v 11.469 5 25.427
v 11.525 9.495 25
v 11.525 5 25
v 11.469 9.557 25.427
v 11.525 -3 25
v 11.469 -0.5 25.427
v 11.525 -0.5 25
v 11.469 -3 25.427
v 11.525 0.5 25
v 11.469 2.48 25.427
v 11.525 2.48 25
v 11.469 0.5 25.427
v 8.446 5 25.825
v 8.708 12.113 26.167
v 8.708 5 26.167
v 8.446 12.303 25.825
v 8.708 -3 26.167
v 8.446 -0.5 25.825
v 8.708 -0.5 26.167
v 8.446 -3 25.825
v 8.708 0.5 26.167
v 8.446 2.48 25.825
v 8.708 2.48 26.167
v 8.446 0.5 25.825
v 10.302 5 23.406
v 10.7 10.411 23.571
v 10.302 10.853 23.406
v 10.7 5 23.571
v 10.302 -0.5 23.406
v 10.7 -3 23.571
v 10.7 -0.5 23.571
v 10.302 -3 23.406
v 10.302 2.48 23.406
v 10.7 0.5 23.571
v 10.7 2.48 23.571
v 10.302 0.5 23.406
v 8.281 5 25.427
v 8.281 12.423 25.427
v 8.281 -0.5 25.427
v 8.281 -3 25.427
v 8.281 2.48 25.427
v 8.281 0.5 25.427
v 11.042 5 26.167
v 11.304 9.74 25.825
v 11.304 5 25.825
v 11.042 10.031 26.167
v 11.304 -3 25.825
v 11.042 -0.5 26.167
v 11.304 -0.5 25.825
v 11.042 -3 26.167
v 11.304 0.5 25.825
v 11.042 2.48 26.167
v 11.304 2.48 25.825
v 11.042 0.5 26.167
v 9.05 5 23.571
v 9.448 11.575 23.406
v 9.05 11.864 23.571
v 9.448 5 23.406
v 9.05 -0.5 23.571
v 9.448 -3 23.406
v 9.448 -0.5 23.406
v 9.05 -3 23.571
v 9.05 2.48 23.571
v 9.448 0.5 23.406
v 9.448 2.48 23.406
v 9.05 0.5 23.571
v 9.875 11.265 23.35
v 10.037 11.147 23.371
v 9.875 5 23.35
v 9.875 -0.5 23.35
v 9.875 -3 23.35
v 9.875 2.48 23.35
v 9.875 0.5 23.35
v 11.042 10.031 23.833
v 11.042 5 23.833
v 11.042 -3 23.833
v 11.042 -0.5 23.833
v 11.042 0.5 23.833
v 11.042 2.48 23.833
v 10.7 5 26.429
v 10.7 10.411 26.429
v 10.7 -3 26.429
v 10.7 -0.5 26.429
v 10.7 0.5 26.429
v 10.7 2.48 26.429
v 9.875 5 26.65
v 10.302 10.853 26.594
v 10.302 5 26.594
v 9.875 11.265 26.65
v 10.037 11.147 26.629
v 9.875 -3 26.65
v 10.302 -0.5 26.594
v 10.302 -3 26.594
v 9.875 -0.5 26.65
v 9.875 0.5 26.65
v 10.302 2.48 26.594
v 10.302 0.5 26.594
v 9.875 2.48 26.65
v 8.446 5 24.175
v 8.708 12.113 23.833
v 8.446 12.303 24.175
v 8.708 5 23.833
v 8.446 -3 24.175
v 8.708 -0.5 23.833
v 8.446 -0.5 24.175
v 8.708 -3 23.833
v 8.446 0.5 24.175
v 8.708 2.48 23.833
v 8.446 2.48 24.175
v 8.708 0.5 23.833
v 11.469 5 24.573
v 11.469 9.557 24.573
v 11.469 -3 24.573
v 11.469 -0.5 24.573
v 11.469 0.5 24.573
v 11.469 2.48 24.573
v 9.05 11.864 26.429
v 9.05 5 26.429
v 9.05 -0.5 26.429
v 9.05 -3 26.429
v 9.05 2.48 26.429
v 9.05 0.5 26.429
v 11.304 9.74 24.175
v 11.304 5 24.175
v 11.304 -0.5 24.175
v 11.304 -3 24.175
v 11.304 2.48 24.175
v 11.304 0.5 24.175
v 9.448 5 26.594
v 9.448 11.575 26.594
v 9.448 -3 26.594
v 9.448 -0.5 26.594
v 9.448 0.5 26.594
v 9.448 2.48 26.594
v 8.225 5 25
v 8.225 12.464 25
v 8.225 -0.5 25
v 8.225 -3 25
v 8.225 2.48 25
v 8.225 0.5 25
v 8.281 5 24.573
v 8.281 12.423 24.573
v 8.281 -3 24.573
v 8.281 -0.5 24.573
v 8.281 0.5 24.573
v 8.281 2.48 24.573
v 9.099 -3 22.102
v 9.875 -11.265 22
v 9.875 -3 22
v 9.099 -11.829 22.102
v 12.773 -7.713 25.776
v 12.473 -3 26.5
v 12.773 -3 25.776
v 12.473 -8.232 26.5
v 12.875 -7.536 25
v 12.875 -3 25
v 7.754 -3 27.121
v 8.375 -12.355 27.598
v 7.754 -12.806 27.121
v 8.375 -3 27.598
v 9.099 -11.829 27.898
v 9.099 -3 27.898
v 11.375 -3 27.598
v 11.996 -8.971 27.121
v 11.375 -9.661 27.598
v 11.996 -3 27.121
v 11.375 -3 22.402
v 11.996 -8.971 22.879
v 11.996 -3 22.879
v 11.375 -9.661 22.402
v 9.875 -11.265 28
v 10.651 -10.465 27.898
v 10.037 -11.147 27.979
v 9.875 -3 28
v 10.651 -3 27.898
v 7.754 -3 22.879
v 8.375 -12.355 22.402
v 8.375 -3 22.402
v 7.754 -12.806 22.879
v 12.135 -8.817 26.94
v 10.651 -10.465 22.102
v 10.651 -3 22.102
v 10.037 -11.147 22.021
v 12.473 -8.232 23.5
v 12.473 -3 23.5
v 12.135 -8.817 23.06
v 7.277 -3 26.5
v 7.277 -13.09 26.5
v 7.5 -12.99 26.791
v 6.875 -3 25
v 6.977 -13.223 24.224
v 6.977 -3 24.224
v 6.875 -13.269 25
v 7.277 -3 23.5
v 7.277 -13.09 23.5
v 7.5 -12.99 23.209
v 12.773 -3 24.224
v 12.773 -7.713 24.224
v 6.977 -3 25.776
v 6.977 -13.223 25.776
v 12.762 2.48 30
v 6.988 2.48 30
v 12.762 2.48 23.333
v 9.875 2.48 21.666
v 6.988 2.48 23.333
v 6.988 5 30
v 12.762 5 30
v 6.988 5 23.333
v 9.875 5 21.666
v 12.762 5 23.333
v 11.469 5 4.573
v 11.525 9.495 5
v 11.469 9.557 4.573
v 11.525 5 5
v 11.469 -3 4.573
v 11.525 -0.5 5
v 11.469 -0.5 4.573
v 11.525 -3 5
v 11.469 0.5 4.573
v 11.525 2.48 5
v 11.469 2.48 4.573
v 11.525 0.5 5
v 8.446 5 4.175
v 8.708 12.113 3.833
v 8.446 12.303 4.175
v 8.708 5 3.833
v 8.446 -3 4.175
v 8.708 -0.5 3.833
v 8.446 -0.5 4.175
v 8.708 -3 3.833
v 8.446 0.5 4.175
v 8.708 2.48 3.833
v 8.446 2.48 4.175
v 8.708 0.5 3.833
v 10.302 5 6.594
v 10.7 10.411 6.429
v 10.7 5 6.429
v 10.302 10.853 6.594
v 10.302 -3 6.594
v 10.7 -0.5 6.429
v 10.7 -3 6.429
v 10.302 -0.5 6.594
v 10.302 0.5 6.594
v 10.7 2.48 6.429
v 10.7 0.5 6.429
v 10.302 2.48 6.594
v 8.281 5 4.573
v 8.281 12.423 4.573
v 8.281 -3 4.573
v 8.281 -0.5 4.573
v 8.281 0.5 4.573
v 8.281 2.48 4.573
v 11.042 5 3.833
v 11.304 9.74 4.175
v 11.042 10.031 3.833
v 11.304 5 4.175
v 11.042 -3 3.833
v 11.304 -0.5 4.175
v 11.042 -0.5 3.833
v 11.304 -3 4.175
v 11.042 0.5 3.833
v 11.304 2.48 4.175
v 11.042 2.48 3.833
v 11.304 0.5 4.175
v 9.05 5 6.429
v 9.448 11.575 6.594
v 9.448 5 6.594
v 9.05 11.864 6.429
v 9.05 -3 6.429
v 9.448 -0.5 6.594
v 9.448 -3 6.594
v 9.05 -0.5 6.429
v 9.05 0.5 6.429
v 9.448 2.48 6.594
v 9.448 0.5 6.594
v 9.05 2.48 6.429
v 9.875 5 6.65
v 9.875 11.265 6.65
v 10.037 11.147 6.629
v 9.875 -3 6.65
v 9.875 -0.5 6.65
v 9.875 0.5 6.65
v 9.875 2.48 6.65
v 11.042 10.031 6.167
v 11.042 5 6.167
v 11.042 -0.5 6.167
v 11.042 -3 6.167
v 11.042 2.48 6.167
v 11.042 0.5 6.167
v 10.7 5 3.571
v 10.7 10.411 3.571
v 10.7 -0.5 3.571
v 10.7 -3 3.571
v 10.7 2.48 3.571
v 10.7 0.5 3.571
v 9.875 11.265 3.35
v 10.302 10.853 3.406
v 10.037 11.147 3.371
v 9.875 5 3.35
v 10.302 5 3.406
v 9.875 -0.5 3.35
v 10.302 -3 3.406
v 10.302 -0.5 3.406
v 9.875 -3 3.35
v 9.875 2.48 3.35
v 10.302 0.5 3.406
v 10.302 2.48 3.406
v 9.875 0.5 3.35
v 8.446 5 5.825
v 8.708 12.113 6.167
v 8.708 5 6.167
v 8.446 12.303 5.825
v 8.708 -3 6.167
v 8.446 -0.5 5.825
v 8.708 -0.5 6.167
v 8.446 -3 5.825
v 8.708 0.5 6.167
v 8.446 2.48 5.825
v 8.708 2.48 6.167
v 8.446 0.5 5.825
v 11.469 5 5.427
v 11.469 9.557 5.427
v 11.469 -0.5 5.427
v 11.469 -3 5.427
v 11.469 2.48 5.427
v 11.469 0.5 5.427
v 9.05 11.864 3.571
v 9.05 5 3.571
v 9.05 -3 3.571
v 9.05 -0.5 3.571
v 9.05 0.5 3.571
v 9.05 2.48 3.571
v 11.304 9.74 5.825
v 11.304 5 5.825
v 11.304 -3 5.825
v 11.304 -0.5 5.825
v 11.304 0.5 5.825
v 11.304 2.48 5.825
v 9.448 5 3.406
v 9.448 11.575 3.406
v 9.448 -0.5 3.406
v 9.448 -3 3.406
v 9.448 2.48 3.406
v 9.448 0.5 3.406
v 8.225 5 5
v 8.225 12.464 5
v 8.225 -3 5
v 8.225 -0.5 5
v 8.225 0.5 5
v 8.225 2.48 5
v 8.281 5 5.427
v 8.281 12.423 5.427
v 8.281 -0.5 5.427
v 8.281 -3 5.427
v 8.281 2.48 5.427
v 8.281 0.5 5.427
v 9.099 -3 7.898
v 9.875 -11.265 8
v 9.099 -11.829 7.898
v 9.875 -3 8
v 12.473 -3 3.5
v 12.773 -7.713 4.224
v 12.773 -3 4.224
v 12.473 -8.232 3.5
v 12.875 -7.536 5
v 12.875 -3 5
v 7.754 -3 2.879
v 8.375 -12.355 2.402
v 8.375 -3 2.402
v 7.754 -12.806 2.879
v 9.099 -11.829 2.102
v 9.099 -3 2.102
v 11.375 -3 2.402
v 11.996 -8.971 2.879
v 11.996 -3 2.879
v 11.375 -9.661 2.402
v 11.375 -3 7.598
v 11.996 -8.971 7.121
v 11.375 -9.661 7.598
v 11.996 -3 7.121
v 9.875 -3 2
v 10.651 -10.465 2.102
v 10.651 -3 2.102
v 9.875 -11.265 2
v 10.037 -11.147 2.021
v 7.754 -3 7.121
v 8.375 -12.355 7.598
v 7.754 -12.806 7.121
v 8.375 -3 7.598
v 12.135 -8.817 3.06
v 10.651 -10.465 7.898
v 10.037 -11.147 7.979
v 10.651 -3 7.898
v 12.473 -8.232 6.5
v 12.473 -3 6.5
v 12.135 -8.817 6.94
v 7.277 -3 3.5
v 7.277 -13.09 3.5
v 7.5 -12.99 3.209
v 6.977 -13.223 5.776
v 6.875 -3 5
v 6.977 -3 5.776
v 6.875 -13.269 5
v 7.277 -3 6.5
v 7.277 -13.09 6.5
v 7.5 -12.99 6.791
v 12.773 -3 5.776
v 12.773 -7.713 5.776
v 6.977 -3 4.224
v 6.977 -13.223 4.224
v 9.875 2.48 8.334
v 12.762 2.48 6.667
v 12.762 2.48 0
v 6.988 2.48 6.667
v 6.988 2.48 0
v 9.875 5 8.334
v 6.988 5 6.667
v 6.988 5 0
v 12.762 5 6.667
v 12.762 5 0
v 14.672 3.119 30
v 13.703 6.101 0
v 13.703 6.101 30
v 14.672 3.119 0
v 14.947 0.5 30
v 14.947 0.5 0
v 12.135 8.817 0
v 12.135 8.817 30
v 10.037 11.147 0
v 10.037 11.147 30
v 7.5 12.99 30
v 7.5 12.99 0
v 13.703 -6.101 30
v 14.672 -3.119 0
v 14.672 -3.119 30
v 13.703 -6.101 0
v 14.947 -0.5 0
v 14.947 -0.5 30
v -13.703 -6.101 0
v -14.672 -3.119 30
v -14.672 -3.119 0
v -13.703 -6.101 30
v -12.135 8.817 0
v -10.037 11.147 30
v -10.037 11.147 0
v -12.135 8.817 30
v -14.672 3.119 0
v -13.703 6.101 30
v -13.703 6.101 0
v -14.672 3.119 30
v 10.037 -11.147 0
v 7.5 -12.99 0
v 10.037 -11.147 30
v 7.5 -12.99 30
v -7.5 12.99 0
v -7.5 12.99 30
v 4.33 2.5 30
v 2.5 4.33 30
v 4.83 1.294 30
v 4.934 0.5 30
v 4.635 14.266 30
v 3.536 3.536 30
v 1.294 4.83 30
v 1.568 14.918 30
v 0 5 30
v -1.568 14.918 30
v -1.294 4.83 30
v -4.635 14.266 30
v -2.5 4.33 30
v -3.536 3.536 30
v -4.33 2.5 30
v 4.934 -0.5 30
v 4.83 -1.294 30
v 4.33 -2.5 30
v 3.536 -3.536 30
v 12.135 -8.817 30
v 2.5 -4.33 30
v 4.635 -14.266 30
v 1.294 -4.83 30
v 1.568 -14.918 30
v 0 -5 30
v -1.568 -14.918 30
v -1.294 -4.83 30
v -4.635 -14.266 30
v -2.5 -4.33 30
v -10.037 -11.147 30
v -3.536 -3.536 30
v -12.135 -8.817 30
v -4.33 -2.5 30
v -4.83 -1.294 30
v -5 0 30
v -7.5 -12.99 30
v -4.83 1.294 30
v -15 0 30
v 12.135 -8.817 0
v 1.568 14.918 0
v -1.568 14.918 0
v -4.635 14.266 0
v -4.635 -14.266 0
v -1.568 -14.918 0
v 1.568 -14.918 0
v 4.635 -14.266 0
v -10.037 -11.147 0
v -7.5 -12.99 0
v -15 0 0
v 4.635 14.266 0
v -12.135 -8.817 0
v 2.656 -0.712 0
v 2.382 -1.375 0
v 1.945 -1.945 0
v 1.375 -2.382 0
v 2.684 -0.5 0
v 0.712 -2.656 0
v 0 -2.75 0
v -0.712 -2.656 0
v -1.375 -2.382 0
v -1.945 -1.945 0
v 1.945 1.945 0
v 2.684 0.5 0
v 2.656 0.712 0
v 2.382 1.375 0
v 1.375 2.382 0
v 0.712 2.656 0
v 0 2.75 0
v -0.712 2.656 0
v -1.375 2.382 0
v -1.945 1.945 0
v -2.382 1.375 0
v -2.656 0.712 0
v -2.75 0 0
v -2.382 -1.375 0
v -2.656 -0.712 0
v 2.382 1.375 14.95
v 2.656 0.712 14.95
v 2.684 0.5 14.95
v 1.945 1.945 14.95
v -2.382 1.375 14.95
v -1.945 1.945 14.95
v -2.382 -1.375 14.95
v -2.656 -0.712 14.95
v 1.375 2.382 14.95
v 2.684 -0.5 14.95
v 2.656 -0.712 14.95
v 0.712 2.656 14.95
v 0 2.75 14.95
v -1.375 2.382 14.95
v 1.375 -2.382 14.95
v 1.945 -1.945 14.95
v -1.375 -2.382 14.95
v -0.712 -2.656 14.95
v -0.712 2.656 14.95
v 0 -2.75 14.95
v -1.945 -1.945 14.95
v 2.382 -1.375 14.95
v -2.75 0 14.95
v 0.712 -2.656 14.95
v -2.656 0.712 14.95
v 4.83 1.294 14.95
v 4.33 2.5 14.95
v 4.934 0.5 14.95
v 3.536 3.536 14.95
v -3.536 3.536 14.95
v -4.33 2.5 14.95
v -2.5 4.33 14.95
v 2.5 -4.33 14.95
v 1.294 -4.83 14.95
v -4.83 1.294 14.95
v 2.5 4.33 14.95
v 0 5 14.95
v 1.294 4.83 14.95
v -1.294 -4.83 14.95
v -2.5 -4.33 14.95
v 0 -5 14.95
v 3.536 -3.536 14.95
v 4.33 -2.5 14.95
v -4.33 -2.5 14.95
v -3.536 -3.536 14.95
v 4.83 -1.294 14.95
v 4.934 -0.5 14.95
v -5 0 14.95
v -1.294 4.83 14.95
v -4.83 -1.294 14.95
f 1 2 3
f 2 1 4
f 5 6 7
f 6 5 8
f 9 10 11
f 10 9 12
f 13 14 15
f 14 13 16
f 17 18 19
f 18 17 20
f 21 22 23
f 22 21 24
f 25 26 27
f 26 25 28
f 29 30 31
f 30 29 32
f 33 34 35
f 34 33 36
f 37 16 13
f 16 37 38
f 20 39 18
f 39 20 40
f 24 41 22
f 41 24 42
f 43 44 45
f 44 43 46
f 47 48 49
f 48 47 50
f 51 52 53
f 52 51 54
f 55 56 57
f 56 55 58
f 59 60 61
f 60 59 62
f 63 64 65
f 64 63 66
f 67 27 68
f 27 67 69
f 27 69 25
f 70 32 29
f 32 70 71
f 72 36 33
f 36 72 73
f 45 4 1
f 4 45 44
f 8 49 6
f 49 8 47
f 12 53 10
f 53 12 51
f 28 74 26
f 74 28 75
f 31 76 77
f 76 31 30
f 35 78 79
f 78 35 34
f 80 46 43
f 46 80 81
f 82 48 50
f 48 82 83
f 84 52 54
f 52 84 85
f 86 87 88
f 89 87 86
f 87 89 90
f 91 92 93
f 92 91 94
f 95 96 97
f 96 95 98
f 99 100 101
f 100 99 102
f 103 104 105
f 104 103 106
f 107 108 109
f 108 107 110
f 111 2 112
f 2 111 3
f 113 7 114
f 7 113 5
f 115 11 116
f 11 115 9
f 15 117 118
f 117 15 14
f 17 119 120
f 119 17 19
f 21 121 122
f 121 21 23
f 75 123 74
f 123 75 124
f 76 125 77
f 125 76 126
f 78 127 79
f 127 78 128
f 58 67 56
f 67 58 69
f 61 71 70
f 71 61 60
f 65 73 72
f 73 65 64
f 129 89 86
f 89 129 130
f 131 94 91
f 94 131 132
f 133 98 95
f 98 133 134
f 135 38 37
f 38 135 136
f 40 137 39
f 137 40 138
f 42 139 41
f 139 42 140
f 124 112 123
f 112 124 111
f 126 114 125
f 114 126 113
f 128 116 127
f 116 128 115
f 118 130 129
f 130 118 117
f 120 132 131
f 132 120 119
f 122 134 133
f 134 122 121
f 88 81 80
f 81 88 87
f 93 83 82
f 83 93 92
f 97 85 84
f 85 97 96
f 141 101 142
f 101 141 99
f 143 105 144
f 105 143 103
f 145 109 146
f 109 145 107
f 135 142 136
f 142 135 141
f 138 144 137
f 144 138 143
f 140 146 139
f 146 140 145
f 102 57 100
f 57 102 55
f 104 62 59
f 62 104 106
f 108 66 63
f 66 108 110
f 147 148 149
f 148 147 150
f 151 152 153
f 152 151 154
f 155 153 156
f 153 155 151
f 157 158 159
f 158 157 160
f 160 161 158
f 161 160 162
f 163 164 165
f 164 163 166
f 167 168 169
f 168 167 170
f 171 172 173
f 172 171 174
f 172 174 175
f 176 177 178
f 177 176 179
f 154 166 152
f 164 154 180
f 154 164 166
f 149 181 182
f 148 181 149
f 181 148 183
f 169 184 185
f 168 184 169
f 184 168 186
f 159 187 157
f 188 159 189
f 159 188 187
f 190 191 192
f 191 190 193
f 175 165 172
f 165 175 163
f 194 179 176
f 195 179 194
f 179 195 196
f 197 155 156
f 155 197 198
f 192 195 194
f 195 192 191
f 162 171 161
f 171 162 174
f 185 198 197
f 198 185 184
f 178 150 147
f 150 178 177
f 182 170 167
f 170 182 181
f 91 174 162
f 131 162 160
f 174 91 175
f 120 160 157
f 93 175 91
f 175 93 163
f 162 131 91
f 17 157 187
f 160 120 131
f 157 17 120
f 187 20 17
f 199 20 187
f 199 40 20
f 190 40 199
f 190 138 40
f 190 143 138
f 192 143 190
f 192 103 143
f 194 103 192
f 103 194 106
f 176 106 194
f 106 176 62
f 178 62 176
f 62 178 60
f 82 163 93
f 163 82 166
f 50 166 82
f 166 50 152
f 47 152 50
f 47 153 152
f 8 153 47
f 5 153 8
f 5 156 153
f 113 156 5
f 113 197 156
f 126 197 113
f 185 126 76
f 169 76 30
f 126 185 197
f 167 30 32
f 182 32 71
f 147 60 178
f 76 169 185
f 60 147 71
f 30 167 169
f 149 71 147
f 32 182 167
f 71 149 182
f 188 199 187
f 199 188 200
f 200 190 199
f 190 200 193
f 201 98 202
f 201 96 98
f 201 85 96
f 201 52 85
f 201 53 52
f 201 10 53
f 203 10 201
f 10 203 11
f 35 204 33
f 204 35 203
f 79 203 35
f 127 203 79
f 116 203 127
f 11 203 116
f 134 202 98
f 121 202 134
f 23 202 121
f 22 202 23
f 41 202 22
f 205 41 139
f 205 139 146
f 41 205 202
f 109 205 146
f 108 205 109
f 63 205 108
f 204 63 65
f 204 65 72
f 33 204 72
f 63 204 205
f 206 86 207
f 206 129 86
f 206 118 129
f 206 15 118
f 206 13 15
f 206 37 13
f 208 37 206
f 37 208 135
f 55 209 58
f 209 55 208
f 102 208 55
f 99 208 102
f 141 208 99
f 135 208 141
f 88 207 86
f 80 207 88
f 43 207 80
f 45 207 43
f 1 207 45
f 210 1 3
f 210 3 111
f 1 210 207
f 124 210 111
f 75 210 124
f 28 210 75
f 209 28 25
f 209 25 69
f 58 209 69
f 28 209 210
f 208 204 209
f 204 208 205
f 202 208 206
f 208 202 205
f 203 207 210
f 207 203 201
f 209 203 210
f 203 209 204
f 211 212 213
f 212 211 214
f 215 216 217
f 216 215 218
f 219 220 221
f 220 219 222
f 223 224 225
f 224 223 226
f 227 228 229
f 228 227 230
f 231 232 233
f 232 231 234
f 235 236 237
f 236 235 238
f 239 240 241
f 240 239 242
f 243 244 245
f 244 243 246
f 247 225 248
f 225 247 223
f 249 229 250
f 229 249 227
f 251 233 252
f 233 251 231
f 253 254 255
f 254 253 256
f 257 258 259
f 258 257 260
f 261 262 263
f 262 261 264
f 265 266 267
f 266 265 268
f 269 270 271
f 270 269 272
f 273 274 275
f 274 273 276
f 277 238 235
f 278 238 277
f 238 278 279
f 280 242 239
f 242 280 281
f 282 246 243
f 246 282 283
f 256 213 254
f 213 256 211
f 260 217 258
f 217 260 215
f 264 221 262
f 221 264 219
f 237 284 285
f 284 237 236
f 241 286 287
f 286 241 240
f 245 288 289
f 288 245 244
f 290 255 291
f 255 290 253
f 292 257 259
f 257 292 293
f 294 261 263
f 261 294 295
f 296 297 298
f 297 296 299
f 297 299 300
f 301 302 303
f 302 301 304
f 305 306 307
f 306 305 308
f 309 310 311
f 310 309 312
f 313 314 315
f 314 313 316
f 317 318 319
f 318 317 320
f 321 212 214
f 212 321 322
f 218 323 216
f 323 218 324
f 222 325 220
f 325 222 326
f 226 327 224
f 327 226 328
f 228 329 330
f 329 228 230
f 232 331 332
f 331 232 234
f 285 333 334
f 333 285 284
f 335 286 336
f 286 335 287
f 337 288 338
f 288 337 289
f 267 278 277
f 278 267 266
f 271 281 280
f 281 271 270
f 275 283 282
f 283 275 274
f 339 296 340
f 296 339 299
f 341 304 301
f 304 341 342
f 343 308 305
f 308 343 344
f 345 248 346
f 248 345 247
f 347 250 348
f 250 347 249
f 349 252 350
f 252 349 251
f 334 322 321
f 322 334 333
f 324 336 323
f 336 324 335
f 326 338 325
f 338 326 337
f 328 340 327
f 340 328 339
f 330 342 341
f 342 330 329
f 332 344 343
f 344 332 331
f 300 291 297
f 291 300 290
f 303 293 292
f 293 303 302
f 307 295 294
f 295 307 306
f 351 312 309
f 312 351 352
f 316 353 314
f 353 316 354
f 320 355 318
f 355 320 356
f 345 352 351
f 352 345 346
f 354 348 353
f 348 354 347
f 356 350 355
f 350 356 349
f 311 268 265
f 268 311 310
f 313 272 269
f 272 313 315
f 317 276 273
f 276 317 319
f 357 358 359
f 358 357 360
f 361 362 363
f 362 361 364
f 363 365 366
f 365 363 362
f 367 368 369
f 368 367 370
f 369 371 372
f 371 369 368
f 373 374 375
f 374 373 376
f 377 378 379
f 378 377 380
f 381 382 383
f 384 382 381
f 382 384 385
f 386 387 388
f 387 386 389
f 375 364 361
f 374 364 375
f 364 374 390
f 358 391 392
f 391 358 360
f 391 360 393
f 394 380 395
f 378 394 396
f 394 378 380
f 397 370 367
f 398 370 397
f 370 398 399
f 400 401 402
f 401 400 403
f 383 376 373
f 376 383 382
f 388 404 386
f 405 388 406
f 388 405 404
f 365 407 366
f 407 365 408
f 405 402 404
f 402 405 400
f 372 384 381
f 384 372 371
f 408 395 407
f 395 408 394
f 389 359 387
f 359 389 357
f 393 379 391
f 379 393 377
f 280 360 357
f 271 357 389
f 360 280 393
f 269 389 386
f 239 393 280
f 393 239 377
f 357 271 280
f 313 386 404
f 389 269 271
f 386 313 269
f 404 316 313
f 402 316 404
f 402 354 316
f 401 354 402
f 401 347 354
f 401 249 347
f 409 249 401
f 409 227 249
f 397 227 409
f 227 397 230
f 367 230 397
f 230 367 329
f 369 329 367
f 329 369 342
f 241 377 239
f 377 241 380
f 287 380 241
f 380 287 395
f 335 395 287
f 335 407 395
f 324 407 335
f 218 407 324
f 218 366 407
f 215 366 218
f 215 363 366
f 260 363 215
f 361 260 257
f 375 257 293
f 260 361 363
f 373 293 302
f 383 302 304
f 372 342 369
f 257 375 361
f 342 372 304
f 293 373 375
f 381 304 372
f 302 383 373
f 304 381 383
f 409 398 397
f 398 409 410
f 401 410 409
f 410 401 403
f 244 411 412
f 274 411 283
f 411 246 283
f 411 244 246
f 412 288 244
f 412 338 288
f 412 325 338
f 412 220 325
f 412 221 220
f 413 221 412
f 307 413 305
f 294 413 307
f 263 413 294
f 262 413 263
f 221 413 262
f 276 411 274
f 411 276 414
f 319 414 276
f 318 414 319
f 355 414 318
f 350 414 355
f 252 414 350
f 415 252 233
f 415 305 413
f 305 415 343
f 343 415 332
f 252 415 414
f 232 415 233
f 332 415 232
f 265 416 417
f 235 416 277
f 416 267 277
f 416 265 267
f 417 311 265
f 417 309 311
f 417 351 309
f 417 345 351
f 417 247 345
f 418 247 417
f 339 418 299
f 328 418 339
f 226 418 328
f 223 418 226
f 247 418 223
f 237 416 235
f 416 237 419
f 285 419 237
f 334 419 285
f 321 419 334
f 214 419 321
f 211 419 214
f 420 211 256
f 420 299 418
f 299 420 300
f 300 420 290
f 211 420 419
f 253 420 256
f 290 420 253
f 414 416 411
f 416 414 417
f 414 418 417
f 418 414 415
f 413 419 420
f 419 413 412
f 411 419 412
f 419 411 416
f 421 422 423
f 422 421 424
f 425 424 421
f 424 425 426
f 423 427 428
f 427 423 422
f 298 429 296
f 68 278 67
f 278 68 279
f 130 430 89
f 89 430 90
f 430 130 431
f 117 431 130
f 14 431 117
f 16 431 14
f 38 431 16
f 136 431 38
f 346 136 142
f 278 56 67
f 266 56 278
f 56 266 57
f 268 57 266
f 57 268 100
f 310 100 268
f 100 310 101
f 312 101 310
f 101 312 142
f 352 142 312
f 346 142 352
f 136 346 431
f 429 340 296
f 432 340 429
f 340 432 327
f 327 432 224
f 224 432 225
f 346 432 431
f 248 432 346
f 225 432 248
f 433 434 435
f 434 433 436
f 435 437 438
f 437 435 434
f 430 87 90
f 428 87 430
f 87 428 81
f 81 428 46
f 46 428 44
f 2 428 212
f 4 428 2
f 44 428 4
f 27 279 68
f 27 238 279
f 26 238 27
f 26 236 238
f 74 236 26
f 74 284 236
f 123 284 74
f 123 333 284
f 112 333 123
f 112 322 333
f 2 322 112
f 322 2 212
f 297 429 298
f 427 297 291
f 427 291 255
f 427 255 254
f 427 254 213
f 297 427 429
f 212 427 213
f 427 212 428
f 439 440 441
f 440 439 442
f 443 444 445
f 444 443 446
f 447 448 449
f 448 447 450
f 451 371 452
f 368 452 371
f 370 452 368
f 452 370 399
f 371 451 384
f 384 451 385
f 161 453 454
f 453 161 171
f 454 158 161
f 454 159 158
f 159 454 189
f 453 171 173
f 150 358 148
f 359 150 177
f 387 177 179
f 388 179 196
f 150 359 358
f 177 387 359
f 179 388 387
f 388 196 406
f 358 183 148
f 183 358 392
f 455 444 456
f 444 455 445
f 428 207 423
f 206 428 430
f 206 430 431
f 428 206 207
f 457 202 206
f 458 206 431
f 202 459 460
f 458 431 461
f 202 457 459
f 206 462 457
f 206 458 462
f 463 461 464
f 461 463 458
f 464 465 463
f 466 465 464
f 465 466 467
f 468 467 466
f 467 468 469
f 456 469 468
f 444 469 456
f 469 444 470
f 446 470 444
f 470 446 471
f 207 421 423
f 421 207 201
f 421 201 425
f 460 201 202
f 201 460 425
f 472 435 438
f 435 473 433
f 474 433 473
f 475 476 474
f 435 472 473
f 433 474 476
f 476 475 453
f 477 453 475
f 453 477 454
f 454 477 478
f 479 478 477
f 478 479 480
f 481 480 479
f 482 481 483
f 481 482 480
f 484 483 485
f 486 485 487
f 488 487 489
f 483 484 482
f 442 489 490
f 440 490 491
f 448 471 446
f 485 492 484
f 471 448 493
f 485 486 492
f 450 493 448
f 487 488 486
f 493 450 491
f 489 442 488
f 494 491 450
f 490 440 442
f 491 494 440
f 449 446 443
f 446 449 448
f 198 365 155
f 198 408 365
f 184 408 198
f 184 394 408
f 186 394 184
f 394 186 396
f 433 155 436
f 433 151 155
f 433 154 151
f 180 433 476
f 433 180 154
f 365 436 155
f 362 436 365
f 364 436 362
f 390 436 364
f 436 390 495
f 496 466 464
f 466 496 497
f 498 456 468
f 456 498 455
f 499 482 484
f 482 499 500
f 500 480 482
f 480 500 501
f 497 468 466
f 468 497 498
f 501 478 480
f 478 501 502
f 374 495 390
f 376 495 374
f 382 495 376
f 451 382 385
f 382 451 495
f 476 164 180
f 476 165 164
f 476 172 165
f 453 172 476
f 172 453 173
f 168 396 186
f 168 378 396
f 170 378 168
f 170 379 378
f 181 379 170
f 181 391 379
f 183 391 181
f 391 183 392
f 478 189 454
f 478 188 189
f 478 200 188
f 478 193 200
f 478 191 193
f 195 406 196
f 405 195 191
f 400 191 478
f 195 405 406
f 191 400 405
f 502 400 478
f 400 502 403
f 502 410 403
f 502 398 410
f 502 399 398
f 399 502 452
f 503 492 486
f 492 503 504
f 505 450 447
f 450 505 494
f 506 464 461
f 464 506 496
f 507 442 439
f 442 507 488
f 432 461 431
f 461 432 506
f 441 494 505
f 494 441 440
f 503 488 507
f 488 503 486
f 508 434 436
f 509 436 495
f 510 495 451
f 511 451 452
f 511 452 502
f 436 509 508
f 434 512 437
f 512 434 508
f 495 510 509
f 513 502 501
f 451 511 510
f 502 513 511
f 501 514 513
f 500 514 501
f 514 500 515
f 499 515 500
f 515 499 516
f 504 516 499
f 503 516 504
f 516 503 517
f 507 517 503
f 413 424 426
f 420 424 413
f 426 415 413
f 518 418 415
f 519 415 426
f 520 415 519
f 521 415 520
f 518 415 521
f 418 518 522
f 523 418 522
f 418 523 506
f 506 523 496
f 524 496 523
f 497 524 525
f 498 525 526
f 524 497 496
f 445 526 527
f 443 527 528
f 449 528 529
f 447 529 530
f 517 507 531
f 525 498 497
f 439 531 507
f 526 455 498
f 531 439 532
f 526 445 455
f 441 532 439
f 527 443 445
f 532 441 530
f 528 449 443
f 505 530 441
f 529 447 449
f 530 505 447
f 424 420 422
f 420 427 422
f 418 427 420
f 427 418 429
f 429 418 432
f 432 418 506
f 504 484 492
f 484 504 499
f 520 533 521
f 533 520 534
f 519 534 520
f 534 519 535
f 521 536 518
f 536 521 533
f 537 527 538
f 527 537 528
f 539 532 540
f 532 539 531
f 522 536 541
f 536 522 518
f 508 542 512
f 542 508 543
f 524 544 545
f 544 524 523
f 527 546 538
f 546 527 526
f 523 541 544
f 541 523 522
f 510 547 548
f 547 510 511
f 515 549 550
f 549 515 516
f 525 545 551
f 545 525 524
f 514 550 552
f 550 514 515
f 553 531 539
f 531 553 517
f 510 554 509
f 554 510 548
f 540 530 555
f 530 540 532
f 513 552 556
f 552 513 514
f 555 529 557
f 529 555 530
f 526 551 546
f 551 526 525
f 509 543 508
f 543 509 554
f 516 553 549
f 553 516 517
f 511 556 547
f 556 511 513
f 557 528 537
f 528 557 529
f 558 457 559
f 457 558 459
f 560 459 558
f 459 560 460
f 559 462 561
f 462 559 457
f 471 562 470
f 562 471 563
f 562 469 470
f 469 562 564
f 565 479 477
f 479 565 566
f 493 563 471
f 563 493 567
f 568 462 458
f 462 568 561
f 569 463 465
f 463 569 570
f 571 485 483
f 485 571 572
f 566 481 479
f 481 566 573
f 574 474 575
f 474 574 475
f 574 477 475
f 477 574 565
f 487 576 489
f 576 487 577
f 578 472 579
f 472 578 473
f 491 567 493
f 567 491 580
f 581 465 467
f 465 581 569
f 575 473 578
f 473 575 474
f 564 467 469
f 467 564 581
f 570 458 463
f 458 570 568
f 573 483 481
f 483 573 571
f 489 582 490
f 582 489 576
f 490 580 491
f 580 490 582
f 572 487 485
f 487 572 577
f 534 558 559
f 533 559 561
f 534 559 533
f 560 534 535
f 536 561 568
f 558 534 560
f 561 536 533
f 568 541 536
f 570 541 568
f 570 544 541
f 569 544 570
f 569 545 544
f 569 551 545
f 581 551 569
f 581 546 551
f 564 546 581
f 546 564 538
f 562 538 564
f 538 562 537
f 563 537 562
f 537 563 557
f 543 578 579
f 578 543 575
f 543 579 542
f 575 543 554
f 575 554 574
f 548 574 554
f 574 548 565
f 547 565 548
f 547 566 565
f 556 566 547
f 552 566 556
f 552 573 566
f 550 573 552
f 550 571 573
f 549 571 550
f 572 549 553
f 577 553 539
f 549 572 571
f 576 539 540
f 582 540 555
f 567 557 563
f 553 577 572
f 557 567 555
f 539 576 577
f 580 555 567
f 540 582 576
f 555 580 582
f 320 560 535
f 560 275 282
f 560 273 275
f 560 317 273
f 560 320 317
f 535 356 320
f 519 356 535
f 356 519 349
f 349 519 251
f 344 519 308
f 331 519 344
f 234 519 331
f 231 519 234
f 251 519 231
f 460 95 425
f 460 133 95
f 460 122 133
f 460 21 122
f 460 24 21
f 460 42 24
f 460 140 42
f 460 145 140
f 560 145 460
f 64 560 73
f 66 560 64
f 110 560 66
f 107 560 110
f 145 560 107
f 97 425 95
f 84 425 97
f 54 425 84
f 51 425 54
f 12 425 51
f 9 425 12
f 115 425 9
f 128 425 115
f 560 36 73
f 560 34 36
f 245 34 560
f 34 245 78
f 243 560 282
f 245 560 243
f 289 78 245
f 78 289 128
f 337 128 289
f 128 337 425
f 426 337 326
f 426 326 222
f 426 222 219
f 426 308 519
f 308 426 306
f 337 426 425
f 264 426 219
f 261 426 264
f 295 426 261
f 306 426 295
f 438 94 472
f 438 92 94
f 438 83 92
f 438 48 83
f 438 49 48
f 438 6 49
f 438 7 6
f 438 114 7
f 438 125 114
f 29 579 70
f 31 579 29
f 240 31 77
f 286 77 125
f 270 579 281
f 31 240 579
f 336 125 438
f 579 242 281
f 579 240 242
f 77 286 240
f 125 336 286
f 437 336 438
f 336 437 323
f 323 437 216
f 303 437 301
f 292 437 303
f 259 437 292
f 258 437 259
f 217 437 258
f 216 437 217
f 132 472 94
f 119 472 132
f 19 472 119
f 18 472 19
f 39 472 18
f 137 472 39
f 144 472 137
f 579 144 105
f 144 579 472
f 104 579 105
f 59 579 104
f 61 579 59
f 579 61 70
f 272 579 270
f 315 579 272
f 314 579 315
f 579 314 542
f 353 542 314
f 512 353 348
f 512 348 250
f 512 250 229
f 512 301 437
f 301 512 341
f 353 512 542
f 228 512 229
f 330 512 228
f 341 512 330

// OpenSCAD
// file: config.scad
snappy_version = 0.91;


// 0 = Thinning Walls (Thin in the middle, thick at edges.  Prettier smooth walls.)
// 1 = Corrugated walls. (Zig-zagged walls. Less shrinkage stress. Closed walls.)
// 2 = Crossbeam walls. (Open sparse struts. Far less shrinkage stress. Recommended.)
wall_styling = 2;


platform_length = 100; // mm.  Must be a multiple of rack_tooth_size.
platform_width  = 150; // mm
platform_height =  40; // mm
platform_thick  =   7; // mm

rail_length   = 150;    // mm
rail_height   =  50;    // mm
rail_thick    =   7;    // mm
rail_offset   =  12;    // mm

motor_rail_length = 100; // mm
cantilever_length = 125; // mm

groove_angle  =  30;    // degrees
groove_height =  12;    // mm

joiner_angle  =  30;    // degrees
joiner_width  =  10;    // mm

rack_tooth_size  =  5; // mm per tooth.
set_screw_size   =  3; // mm size of set screw in drive gears, couplers, etc
motor_shaft_size =  5; // mm
motor_shaft_flatted = false;  // boolean. Set true if motor shaft has a flattened side.

// Currently configured for 3/8" ACME threaded rod and matching 11/16" nut
lifter_rod_diam    =   9.5; // mm
lifter_rod_length  = 300.0; // mm
lifter_thread_size =   3.175; // mm lift per revolution

/*
// Mechanical endstop boards.
endstop_hole_spacing = 19; // mm
endstop_hole_inset   =  4; // mm
endstop_hole_hoff    = 10; // mm
endstop_click_voff   =  4; // mm
endstop_screw_size   =  3; // mm
endstop_standoff     =  2; // mm
*/

// Mechanical endstop bare microswitch.
endstop_hole_spacing =  9.5; // mm
endstop_hole_inset   =  9; // mm
endstop_hole_hoff    = 10; // mm
endstop_click_voff   =  3; // mm
endstop_screw_size   =  2.5; // mm
endstop_standoff     =  2; // mm

// Standard Mk2b Heated Build Platform from RepRapDiscount.com
hbp_width       = 215;   // mm
hbp_length      = 215;   // mm
hbp_hole_width  = 208.5; // mm
hbp_hole_length = 208.5; // mm
hbp_screwsize   =   3;   // mm

// Standard 200mm square borosilicate glass build platform
glass_width     = 214;   // mm
glass_length    = 200;   // mm
glass_thick     =   3;   // mm

// Fan shroud dimensions
fan_size         = 60;  // mm
fan_screw_size   =  4;  // mm
fan_mount_length = 15;  // mm
fan_mount_width  = 10;  // mm
fan_mount_screw  =  3;  // mm
fan_shroud_angle = 60;  // degrees

// Cable chain dimentions
cable_chain_height = 13;  // mm
cable_chain_width  = 25;  // mm
cable_chain_length = 26;  // mm
cable_chain_pivot  =  6;  // mm
cable_chain_bump   =  1;  // mm
cable_chain_wall   =  3;  // mm

// This is the slop needed to make parts fit more exactly, and may be
// printer dependant.  Printing a slop calibration plate should help
// dial this setting in for your printer.
printer_slop =   0.25; // mm



// Commonly used derived values.  Don't change these.
rail_spacing = platform_width - joiner_width*4 - 10;
rail_width = rail_spacing + joiner_width*2;
motor_mount_spacing=43+joiner_width+10;
side_mount_spacing = platform_length-25;

wall_styles = ["thinwall", "corrugated", "crossbeams"];
wall_style = wall_styles[wall_styling];


// vim: noexpandtab tabstop=4 shiftwidth=4 softtabstop=4 nowrap
// main file
include <config.scad>
use <GDMUtils.scad>


module lifter_rod_coupler()
{
	diam = 30;
	height = 30;
	color("SpringGreen")
	translate([0,0,height/2])
	difference () {
		cylinder(h=height, d=diam, center=true);
		translate([0, 0, -height/4])
			cylinder(h=height/2+0.1, d=motor_shaft_size+printer_slop*2, center=true, $fn=24);
		translate([0, 0, height/4])
			cylinder(h=height/2+0.1, d=lifter_rod_diam+printer_slop*2, center=true, $fn=24);
		translate([diam/4, 0, 0]) {
			cube(size=[diam/2+0.1, 1, height+0.1], center=true);
		}
		translate([(diam+lifter_rod_diam)/2/2, 0, 0]) {
			mirror_copy([0,0,1]) {
				translate([0, 0, height/2-set_screw_size-2]) {
					xrot(90) cylinder(h=diam+0.1, d=set_screw_size*1.1, center=true, $fn=24);
					translate([0, -(diam/4+3), 0]) {
						xrot(90) cylinder(d=set_screw_size*2, h=diam/2, center=true, $fn=24);
					}
					translate([0, 5, height/8]) {
						hull() {
							grid_of(count=[1,1,2], spacing=height/4) {
								xrot(90) zrot(90) {
									scale([1.05,1.05,1.05]) {
										metric_nut(size=set_screw_size, hole=false);
									}
								}
							}
						}
					}
				}
			}
		}
	}
}
//!lifter_rod_coupler();


module lifter_rod_coupler_parts() { // make me
	lifter_rod_coupler();
}


lifter_rod_coupler_parts();


// vim: noexpandtab tabstop=4 shiftwidth=4 softtabstop=4 nowrap
